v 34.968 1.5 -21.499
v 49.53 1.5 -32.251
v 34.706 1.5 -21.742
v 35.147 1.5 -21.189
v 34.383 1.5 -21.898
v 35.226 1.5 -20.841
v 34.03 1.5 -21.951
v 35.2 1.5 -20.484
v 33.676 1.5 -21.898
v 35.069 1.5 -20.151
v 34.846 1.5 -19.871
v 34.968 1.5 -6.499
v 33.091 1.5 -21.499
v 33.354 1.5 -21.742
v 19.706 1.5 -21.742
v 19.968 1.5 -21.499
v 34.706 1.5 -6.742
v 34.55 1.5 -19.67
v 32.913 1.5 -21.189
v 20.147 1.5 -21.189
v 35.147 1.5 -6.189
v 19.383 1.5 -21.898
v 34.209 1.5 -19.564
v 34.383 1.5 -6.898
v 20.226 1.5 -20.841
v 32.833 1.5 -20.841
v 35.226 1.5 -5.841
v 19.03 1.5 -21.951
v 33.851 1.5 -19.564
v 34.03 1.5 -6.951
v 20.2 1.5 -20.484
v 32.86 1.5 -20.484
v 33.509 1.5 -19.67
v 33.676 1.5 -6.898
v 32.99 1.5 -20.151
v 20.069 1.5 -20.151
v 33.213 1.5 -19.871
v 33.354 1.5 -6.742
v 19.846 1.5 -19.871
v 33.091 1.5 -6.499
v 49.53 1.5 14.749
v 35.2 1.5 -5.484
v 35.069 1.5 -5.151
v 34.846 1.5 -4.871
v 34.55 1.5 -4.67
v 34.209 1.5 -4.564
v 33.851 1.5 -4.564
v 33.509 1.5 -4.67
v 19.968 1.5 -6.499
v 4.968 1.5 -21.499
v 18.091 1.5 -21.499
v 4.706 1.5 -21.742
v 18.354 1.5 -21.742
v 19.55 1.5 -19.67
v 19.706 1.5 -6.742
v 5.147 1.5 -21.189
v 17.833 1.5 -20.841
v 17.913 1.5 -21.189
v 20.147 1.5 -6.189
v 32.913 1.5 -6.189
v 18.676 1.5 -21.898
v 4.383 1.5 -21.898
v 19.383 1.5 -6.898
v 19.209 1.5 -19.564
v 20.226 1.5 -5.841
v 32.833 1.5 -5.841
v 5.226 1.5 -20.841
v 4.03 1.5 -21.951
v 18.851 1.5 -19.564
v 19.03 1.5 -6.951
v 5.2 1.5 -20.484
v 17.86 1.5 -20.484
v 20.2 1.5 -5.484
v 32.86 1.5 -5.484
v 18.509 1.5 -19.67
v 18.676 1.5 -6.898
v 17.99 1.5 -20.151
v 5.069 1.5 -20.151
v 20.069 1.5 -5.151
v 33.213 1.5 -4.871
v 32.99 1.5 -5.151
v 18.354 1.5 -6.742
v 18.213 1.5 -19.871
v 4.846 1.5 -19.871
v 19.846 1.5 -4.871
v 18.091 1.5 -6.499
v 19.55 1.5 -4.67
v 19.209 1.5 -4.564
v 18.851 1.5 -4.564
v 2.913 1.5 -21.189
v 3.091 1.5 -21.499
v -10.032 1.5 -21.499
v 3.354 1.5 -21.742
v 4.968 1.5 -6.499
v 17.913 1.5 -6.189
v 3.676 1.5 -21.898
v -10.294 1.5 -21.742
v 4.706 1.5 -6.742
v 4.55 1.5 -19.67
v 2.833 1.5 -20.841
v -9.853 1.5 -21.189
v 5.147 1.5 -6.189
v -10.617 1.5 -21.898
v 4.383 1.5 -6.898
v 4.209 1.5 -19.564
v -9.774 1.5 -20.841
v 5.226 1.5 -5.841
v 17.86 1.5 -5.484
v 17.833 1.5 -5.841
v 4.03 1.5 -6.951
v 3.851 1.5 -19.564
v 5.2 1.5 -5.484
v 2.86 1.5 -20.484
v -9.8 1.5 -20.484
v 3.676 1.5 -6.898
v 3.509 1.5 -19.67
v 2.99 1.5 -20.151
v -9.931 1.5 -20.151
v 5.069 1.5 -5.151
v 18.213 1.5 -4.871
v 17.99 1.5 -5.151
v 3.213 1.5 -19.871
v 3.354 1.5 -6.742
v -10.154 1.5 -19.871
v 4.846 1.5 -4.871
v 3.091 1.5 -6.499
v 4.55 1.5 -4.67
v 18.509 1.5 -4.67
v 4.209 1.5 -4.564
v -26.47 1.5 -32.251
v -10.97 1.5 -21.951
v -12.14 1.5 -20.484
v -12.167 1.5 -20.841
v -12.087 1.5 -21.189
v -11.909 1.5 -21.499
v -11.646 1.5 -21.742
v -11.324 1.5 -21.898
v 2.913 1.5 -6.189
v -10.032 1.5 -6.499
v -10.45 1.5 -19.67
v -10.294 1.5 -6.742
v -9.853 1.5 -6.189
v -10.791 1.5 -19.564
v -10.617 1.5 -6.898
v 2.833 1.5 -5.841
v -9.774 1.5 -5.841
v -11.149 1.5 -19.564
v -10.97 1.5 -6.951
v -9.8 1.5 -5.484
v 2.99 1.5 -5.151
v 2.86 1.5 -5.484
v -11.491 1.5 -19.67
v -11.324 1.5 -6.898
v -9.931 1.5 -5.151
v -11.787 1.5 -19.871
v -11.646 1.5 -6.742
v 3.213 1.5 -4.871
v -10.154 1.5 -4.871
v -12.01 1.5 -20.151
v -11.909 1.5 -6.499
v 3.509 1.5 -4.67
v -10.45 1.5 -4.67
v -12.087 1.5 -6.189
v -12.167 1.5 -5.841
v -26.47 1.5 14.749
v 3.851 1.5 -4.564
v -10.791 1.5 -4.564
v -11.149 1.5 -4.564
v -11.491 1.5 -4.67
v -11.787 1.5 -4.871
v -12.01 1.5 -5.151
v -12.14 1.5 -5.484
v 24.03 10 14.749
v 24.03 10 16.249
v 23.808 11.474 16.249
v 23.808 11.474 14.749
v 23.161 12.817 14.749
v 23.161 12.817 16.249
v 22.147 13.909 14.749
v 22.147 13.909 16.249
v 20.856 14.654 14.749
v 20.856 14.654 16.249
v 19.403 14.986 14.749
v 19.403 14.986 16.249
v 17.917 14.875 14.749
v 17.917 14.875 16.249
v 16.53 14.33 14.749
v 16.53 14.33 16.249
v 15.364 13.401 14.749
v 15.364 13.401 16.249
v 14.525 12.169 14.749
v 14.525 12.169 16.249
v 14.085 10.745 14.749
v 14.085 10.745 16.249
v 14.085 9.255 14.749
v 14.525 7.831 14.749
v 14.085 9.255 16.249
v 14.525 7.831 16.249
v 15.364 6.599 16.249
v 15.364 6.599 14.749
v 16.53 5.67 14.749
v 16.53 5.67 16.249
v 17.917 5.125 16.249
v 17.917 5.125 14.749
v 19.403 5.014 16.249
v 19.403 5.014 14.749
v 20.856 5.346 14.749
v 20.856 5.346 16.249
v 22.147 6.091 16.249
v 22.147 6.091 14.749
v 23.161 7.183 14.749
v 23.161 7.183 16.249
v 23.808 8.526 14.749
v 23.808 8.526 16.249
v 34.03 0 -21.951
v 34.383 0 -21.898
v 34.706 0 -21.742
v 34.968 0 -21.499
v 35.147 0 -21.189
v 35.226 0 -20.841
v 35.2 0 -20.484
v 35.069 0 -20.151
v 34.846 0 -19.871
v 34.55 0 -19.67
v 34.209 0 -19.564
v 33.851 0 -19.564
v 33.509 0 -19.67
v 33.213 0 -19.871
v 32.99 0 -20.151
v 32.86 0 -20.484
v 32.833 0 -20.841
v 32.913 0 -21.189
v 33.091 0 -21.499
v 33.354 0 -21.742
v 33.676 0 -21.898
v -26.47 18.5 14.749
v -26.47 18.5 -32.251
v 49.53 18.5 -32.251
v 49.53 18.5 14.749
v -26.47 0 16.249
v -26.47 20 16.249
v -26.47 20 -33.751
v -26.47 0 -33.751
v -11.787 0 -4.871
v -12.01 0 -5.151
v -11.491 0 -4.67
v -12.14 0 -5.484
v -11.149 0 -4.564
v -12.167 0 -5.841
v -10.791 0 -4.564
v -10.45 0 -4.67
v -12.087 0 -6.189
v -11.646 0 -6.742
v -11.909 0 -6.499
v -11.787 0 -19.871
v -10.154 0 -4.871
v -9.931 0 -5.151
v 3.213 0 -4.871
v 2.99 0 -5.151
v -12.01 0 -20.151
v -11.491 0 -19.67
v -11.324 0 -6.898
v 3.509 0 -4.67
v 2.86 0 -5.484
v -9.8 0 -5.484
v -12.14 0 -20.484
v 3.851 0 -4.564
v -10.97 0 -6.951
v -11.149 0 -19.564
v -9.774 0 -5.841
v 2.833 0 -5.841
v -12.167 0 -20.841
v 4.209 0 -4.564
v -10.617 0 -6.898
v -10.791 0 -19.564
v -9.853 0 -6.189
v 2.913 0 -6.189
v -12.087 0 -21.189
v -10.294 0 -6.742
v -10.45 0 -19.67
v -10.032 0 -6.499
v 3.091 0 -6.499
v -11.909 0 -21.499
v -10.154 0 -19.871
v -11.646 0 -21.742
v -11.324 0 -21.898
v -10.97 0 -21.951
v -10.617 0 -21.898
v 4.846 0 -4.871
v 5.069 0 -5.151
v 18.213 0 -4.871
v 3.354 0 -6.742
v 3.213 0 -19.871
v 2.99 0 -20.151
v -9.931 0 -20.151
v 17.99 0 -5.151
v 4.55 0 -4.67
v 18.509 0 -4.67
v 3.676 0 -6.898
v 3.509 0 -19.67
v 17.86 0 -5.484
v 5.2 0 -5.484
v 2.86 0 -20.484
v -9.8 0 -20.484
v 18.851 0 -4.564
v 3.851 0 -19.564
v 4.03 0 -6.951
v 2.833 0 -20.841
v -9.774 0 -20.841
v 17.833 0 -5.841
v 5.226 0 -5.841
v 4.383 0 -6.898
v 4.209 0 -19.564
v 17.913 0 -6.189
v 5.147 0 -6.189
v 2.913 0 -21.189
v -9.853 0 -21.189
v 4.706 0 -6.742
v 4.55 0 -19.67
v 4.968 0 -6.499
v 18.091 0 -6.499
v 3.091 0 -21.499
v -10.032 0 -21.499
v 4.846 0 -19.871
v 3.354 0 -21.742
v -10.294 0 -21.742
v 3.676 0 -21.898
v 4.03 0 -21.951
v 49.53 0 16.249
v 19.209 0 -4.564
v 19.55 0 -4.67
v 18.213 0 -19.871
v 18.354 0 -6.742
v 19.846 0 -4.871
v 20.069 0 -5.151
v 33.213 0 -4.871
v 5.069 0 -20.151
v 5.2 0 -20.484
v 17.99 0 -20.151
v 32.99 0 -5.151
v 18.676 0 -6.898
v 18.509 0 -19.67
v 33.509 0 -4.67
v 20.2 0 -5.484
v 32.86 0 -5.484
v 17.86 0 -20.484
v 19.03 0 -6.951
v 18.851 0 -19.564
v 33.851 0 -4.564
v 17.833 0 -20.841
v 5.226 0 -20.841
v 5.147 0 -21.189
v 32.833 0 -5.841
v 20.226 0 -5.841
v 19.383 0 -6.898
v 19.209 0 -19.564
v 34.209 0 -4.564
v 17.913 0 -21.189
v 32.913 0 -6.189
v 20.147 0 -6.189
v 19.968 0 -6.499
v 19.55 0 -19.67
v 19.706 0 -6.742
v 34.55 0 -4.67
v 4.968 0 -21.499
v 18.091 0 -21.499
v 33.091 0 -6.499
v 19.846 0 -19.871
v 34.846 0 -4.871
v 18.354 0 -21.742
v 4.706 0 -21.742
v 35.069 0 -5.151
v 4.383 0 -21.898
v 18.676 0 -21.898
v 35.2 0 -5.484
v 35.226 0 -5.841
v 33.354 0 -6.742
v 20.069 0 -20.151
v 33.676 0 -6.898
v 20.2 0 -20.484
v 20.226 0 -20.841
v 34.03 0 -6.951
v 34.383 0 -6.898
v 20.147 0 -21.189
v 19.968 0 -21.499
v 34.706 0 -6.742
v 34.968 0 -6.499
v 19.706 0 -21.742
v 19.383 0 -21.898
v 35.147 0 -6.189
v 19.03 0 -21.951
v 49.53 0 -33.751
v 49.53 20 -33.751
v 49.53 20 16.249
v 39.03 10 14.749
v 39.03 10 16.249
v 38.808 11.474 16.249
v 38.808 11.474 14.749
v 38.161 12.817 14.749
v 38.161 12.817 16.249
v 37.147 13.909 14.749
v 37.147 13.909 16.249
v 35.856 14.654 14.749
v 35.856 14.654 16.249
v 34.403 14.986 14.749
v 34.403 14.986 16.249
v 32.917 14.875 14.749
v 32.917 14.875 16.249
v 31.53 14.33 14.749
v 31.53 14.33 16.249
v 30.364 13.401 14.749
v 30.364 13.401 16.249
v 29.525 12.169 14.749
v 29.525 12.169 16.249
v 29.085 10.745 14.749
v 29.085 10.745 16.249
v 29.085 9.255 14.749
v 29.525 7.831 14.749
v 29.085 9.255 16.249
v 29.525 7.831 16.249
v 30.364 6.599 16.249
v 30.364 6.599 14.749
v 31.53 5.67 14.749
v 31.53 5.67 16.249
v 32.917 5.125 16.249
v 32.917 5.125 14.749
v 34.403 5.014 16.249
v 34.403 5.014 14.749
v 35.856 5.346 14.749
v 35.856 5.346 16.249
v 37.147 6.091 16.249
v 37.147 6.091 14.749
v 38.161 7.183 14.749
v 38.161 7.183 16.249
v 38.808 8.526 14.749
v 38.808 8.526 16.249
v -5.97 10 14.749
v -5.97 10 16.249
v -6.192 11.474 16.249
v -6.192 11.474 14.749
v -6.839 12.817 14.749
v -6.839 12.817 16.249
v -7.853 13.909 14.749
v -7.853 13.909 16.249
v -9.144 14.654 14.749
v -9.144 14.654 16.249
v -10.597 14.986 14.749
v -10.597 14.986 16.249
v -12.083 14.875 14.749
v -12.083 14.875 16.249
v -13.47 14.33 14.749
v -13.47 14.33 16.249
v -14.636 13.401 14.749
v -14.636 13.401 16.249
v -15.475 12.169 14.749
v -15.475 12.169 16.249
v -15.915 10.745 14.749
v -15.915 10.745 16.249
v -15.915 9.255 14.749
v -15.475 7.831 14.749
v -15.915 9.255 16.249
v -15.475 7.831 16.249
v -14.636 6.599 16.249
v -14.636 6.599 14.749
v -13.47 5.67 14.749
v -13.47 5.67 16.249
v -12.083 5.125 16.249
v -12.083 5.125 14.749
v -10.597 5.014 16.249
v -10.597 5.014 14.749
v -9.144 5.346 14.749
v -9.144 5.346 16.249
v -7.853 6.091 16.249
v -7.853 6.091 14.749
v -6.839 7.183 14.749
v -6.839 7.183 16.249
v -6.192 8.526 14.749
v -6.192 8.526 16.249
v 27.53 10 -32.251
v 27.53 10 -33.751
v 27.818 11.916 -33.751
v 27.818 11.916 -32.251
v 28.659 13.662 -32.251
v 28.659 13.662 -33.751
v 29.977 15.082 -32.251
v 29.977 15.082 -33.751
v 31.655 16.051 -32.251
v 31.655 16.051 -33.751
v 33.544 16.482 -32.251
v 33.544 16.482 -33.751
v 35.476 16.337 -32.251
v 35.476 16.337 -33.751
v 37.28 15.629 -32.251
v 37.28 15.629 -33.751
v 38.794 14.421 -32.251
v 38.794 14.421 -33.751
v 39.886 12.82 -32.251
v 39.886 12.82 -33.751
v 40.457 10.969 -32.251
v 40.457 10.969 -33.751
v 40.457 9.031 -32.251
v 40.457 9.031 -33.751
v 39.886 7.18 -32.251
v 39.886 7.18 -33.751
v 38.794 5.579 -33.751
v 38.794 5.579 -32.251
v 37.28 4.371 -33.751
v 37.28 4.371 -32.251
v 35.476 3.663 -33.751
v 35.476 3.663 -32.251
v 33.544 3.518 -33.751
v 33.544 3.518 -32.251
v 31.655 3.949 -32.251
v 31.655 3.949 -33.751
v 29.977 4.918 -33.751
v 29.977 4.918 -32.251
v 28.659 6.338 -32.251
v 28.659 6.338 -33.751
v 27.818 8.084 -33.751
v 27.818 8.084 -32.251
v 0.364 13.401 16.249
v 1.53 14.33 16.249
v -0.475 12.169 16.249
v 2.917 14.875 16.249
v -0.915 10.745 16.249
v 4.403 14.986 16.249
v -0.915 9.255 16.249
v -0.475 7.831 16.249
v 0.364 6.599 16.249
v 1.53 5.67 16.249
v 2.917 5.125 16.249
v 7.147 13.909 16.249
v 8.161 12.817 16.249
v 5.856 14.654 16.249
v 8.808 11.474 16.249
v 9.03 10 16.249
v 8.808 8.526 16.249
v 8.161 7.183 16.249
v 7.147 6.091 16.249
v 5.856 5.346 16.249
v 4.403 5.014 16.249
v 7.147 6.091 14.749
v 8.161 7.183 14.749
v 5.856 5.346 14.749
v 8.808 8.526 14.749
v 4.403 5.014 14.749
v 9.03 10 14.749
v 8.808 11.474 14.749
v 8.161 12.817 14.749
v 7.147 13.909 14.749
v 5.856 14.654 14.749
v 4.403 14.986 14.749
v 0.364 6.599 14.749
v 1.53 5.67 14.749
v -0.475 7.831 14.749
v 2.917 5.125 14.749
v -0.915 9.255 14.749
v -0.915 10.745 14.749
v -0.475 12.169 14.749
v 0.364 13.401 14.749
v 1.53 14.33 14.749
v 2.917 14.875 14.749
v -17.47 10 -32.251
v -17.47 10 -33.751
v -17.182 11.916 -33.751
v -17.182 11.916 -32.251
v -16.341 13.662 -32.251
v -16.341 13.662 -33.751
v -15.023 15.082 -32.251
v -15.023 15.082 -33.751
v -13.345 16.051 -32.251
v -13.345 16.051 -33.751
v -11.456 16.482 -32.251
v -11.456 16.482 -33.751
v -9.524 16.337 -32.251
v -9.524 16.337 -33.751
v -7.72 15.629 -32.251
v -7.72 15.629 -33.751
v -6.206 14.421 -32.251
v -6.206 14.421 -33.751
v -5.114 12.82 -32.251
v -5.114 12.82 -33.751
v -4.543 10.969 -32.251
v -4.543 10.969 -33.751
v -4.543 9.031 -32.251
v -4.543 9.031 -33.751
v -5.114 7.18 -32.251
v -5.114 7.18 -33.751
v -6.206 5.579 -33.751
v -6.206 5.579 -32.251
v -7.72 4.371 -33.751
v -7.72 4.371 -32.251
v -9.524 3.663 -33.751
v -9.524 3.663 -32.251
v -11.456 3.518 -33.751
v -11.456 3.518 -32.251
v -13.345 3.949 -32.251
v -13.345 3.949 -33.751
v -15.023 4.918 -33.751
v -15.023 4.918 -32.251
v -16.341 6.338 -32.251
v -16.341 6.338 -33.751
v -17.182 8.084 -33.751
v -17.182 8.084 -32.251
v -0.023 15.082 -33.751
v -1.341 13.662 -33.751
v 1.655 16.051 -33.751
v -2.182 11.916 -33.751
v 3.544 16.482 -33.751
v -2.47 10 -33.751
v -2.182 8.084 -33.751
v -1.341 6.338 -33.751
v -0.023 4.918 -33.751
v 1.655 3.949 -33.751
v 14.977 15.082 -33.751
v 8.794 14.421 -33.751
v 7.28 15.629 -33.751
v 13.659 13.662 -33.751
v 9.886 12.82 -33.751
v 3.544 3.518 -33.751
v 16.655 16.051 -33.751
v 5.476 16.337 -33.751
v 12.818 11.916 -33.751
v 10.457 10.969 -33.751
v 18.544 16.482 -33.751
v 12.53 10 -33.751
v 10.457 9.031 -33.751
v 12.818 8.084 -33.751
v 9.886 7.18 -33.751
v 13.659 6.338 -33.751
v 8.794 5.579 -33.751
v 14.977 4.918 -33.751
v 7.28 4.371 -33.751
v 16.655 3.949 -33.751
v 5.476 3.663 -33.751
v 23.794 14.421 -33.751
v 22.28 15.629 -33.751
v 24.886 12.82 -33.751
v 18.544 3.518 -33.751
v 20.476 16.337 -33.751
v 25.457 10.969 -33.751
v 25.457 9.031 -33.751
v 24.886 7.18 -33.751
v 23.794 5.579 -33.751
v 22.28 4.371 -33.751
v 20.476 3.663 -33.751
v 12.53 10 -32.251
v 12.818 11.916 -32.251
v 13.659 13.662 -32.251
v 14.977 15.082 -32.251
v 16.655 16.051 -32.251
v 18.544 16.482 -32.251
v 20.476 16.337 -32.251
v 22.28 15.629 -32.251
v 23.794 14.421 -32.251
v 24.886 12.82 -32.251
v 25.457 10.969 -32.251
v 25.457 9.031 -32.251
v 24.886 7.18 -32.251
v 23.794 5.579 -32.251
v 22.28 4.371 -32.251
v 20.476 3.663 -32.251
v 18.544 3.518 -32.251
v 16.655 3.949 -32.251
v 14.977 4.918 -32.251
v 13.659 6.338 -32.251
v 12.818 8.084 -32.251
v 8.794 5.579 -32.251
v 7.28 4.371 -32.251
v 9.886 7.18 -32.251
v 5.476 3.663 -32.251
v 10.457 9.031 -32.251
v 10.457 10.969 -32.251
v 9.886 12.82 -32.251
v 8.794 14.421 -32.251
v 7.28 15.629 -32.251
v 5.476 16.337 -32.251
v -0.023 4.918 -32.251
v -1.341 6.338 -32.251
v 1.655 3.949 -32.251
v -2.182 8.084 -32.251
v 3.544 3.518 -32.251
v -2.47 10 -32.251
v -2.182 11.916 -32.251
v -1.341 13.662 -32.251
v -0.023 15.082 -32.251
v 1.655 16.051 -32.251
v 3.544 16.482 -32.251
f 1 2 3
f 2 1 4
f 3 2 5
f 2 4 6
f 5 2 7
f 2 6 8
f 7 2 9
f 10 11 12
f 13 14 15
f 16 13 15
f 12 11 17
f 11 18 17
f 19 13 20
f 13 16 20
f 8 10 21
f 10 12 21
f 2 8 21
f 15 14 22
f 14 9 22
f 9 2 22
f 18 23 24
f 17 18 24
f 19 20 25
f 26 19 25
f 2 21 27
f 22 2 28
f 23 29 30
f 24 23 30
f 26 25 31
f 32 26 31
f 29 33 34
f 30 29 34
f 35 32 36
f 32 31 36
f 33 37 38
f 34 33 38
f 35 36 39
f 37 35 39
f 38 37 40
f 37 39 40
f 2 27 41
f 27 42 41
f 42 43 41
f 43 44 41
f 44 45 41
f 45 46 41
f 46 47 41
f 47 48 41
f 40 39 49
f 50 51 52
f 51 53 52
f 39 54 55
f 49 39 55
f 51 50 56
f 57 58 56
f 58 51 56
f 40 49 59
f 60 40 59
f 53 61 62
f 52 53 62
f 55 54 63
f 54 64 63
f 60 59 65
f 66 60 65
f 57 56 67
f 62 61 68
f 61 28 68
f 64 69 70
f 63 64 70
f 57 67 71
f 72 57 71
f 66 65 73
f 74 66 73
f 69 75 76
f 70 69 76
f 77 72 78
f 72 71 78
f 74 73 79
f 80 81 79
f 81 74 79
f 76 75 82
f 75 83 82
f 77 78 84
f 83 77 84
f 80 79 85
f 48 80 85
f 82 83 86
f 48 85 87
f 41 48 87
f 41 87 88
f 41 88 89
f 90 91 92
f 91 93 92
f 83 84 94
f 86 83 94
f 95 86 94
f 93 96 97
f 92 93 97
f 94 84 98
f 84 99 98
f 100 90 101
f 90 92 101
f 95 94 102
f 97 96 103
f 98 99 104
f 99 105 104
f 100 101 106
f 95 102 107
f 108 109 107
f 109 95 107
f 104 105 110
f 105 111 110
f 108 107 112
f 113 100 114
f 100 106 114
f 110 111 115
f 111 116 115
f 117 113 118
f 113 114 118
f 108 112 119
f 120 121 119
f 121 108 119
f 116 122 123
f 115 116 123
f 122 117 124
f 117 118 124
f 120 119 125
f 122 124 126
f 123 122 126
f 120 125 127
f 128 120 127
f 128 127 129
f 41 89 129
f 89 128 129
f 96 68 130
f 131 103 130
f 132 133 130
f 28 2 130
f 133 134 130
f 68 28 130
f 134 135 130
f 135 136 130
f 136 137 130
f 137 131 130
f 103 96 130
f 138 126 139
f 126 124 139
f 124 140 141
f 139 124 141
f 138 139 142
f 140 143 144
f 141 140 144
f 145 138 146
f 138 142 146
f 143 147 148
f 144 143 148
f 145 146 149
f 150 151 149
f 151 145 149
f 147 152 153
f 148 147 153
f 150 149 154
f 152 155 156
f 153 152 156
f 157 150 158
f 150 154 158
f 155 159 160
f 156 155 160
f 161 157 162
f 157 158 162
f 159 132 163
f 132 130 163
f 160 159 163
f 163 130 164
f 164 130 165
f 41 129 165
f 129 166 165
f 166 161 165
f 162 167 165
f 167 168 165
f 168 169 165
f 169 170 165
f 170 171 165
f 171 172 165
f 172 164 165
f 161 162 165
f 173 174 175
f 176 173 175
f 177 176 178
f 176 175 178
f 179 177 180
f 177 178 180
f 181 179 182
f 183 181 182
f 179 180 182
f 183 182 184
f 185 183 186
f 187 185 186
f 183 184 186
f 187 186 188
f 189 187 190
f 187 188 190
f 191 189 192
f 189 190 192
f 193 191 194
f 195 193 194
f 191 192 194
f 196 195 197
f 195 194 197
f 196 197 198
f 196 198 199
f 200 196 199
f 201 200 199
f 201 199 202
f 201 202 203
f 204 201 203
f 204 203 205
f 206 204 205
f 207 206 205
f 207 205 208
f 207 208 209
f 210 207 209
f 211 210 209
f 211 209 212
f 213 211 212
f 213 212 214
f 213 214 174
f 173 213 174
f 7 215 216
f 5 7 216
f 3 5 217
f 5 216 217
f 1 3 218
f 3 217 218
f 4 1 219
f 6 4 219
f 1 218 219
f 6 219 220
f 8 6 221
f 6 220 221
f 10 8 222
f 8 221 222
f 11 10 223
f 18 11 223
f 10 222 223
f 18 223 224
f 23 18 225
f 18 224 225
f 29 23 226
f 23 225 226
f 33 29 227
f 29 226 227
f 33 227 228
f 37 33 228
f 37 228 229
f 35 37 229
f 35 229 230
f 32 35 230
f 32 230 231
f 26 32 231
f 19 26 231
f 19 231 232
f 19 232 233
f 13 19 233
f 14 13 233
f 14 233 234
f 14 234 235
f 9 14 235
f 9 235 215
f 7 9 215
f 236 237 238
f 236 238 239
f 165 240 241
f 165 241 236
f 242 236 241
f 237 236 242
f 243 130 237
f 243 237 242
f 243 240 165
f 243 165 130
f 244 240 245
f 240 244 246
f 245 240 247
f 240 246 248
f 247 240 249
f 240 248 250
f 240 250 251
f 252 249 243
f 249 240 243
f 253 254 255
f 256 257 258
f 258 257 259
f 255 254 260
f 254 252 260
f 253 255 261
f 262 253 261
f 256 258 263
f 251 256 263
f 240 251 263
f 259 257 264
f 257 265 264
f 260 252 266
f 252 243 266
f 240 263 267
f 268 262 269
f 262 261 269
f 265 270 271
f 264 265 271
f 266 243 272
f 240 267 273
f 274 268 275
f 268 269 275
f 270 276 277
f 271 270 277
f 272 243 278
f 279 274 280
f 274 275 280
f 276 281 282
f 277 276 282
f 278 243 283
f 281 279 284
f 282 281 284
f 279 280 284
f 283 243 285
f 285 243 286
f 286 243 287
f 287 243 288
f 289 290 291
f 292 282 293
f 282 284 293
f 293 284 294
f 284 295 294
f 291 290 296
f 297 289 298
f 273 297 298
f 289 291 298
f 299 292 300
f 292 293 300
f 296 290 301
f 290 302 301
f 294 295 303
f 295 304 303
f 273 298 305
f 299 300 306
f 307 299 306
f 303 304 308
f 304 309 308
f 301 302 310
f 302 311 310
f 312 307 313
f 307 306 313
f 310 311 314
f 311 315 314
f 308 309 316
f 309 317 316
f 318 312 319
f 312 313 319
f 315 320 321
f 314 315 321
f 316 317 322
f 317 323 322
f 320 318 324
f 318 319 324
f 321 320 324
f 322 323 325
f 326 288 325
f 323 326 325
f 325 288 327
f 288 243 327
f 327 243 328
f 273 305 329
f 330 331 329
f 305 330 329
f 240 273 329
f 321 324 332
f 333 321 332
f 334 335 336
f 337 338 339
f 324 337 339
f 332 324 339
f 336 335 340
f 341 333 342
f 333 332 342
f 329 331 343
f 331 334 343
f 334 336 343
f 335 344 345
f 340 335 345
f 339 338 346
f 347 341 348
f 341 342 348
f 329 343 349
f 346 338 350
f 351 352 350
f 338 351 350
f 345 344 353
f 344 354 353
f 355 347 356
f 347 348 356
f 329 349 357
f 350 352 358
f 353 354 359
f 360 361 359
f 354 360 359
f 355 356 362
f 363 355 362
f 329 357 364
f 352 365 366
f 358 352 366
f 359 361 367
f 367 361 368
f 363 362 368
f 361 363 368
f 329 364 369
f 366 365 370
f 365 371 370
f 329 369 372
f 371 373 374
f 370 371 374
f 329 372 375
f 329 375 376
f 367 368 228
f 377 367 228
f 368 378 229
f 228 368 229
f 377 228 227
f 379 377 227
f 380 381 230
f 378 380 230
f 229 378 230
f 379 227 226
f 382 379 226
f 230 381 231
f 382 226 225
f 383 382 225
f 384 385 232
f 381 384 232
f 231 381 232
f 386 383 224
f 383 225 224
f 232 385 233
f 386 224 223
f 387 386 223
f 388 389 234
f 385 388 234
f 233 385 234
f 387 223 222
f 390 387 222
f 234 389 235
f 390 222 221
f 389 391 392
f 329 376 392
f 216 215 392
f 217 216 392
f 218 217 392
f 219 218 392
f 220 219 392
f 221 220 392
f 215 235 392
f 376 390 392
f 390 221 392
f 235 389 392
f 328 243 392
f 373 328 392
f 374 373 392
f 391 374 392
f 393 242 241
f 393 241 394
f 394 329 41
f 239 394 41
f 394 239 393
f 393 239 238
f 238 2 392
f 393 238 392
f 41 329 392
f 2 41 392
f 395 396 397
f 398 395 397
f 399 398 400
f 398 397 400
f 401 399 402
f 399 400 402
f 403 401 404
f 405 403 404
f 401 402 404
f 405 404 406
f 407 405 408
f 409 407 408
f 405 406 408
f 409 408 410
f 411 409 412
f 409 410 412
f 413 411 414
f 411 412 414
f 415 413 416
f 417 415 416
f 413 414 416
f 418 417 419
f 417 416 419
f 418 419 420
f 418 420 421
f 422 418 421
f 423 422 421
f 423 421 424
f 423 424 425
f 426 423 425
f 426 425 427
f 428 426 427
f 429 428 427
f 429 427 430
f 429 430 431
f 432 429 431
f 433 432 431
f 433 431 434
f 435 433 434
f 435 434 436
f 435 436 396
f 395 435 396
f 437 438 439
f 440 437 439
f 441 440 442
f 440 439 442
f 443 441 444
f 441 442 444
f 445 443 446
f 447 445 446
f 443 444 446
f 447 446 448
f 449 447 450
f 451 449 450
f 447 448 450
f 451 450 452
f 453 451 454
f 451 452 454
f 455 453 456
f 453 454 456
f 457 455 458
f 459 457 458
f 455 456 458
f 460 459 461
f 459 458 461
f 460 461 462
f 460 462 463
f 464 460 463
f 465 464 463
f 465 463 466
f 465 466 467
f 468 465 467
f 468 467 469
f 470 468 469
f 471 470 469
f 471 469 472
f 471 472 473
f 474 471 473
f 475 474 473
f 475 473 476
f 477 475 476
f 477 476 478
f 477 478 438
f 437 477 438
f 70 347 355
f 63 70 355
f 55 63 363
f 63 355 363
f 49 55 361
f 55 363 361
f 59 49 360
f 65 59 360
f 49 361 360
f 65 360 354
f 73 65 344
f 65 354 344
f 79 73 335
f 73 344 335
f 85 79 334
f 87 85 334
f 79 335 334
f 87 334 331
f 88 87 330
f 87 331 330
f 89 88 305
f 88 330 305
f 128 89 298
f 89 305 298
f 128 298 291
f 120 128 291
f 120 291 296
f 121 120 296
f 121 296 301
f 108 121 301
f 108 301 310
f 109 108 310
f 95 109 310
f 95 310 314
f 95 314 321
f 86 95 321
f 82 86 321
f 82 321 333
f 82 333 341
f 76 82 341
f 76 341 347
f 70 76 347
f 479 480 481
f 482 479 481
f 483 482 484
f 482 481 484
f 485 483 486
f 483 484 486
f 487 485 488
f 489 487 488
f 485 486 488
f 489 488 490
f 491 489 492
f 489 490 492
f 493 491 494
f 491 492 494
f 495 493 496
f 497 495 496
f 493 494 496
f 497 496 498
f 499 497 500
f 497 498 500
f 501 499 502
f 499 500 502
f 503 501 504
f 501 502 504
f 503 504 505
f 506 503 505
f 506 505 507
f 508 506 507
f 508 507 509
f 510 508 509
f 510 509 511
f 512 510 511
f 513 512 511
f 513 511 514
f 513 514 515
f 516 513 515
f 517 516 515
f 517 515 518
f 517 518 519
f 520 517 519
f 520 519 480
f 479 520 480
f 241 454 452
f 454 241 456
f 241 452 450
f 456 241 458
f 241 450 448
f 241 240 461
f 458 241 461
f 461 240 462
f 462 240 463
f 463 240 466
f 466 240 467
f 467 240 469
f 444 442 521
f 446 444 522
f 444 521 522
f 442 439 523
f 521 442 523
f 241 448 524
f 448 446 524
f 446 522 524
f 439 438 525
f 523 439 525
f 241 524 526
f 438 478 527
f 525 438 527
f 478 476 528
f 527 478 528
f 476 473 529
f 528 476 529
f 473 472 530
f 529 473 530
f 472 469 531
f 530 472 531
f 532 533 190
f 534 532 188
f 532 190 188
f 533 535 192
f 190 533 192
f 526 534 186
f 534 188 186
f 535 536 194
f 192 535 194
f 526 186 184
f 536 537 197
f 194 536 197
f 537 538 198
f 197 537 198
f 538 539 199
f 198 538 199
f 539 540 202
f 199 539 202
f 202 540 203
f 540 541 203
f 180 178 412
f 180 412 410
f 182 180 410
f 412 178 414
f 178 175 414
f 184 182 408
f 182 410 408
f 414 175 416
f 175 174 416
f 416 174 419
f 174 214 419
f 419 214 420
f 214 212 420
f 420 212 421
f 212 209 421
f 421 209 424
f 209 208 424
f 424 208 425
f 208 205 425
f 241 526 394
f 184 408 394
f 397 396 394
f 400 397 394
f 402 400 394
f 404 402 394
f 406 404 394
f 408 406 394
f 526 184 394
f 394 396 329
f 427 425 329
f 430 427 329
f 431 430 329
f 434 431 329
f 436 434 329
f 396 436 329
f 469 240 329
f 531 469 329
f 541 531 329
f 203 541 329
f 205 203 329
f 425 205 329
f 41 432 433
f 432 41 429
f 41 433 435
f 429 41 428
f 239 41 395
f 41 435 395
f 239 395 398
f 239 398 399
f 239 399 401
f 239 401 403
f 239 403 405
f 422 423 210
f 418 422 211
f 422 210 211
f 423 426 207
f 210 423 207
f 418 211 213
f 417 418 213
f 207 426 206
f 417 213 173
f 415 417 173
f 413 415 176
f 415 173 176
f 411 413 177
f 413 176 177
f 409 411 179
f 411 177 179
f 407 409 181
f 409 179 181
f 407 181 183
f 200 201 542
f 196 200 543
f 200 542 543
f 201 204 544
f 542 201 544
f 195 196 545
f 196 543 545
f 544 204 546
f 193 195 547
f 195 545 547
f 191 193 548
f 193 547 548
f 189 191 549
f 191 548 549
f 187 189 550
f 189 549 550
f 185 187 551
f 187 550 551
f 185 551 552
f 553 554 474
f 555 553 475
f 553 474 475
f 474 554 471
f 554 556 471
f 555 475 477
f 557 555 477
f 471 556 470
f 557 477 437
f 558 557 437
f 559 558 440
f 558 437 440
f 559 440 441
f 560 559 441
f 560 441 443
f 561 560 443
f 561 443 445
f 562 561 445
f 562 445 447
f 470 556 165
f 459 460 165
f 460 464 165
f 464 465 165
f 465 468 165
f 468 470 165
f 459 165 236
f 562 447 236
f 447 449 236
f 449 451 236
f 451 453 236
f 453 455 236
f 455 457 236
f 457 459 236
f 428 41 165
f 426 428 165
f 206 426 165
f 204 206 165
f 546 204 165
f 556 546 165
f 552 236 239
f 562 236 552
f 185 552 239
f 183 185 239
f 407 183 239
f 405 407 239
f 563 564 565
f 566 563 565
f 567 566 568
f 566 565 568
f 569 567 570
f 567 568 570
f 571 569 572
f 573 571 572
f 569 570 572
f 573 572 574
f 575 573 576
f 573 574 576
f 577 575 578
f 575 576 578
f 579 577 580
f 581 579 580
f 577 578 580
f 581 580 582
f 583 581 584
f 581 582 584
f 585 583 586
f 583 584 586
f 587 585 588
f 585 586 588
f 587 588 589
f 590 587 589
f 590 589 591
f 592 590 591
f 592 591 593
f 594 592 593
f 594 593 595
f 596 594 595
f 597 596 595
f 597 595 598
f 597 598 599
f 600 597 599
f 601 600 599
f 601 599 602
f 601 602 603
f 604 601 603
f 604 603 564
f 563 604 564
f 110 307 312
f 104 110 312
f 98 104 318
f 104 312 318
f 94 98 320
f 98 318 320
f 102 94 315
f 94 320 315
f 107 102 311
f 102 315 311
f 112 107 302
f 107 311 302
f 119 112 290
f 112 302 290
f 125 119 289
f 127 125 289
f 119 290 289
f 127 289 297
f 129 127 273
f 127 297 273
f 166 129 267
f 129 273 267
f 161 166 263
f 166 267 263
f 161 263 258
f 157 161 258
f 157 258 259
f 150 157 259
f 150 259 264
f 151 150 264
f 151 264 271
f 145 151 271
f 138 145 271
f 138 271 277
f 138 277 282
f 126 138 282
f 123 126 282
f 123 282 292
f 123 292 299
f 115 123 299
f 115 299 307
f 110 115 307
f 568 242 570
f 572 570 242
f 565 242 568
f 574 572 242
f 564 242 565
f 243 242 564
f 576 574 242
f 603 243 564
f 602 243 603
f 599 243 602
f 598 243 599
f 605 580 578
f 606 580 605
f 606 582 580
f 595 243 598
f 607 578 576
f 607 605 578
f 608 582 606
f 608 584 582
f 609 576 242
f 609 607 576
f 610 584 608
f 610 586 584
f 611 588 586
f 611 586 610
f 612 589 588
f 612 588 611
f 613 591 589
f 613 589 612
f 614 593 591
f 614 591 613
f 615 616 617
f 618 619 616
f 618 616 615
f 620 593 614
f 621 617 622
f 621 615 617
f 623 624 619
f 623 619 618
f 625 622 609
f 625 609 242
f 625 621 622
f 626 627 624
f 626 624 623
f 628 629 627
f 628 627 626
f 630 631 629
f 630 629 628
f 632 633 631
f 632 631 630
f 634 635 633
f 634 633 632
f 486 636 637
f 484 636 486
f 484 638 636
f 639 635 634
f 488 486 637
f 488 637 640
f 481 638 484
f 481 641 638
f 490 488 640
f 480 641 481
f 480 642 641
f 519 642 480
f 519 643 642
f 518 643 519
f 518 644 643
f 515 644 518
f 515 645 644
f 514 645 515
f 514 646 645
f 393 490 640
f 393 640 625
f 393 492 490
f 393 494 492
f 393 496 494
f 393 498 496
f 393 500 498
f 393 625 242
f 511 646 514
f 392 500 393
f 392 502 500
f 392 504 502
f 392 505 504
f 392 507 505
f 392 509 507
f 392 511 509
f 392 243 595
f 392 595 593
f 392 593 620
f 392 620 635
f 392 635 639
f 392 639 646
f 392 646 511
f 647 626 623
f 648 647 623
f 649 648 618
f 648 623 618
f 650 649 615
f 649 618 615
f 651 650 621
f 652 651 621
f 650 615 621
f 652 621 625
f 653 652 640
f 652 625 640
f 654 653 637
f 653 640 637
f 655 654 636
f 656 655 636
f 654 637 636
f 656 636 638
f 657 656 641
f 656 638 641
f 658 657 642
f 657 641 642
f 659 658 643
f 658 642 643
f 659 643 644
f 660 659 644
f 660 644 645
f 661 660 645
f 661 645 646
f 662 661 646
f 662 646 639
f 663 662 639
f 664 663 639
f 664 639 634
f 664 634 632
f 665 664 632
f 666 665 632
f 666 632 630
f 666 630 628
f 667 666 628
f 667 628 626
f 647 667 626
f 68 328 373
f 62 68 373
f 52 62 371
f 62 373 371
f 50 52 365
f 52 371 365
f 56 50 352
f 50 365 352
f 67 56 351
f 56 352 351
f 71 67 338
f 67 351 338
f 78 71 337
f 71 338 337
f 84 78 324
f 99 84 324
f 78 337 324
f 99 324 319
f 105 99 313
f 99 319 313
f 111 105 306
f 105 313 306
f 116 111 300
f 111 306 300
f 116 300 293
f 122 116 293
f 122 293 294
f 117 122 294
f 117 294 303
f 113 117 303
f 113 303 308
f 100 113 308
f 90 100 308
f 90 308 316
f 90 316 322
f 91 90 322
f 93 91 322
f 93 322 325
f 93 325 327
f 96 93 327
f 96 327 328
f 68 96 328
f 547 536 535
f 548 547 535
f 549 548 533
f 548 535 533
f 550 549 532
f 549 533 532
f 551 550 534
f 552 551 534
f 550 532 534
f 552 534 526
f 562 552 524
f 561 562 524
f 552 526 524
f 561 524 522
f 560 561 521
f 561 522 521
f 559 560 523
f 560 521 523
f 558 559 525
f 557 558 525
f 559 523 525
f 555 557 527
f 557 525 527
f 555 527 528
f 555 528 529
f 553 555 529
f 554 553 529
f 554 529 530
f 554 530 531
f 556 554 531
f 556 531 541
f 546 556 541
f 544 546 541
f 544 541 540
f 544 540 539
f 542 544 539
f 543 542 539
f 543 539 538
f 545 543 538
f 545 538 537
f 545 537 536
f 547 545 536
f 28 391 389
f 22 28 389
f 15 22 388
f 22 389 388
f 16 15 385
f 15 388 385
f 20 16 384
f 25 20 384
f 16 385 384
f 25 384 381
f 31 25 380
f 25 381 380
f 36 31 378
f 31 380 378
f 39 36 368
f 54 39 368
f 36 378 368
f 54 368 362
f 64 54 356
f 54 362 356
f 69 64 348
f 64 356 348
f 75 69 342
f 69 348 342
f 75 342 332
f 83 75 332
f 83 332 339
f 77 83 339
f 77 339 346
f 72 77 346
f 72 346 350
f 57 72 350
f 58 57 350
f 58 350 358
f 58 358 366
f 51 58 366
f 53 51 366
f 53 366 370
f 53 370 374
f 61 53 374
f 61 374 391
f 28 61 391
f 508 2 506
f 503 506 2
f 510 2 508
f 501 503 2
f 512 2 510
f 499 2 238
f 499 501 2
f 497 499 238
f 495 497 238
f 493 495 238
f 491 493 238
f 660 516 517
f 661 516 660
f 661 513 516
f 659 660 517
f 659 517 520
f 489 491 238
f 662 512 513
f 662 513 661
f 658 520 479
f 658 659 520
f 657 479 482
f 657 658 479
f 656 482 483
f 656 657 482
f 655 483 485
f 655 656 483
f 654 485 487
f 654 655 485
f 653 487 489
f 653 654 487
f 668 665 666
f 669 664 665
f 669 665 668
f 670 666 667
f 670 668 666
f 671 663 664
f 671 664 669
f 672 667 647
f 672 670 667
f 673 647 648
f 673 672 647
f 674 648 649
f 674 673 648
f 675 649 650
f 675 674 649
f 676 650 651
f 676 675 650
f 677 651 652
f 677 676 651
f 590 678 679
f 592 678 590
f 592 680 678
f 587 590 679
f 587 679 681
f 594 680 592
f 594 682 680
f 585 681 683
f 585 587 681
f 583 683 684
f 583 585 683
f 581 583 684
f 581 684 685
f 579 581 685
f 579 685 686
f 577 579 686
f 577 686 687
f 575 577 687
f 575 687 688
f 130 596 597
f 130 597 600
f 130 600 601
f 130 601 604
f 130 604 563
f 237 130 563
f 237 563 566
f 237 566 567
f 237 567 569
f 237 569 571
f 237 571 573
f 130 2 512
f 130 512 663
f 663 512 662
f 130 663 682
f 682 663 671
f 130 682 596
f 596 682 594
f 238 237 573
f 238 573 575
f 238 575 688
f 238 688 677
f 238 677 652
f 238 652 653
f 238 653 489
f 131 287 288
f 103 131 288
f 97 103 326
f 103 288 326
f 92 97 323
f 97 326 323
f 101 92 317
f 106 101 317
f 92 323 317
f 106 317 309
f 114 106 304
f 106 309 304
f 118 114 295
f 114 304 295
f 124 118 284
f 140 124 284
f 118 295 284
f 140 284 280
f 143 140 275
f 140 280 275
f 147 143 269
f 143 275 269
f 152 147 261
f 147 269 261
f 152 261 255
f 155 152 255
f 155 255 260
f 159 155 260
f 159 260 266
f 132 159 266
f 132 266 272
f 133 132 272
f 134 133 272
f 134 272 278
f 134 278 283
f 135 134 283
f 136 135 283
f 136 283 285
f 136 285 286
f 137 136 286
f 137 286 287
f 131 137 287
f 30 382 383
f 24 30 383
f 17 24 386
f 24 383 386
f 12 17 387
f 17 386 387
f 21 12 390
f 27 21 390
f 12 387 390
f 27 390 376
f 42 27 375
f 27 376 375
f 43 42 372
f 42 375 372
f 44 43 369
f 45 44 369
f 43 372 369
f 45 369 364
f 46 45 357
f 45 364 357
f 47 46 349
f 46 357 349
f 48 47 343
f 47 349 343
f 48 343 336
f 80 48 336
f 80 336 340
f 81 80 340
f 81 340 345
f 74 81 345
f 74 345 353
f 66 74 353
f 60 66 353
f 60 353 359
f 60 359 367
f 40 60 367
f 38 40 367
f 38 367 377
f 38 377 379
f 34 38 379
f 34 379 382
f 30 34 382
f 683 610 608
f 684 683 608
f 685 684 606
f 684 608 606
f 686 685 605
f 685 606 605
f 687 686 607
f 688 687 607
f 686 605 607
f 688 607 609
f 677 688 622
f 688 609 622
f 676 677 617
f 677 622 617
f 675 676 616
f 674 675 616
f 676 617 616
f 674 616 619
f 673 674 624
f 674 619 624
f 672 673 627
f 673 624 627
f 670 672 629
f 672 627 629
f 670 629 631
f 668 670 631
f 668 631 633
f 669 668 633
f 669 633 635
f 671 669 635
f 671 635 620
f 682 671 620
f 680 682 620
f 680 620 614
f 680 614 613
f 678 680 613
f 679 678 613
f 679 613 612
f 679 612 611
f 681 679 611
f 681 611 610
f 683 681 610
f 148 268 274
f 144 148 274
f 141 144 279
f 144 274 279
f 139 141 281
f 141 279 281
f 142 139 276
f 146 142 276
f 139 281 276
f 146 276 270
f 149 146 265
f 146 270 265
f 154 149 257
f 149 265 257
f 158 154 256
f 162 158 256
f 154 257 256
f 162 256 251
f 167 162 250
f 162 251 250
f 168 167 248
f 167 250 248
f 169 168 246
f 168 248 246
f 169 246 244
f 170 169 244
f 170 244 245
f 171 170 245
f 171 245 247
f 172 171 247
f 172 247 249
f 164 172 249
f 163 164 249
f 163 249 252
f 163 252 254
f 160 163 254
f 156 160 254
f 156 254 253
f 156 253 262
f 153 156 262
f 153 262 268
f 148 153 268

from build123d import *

# Parameters (mm, degrees)
SKETCH1_W           = 76
SKETCH1_H           = 50
BOSS_EXTRUDE1_DEPTH = 20
SKETCH2_W           = 47
SKETCH2_H           = 17
CUT_EXTRUDE1_DEPTH  = 76
SKETCH3_R           = 6.5
CUT_EXTRUDE2_DEPTH  = 2
SKETCH4_R           = 5
CUT_EXTRUDE3_DEPTH  = 2
SKETCH5_R           = 1.2
CUT_EXTRUDE4_DEPTH  = 2


with BuildPart() as part:
    # Sketch1 → Boss-Extrude1 (new body)
    with BuildSketch(Plane(origin=(0, 0, 0), x_dir=(1, 0, 0), z_dir=(0, 1, 0))):
        with Locations((11.529653553, 8.750876438)):
            Rectangle(SKETCH1_W, SKETCH1_H)
    extrude(amount=BOSS_EXTRUDE1_DEPTH)

    # Sketch2 → Cut-Extrude1 (cut)
    with BuildSketch(Plane.ZY.offset(26.470346447)):
        with Locations((-8.750876438, 10)):
            Rectangle(SKETCH2_W, SKETCH2_H)
    extrude(amount=-CUT_EXTRUDE1_DEPTH, mode=Mode.SUBTRACT)

    # Sketch3 → Cut-Extrude2 (cut)
    with BuildSketch(Plane(origin=(0, 0, -33.750876438), x_dir=(-1, 0, 0), z_dir=(0, 0, -1))):
        with Locations((10.970346447, 10)):
            Circle(SKETCH3_R)
        with Locations((-4.029653553, 10)):
            Circle(SKETCH3_R)
        with Locations((-19.029653553, 10)):
            Circle(SKETCH3_R)
        with Locations((-34.029653553, 10)):
            Circle(SKETCH3_R)
    extrude(amount=-CUT_EXTRUDE2_DEPTH, mode=Mode.SUBTRACT)

    # Sketch4 → Cut-Extrude3 (cut)
    with BuildSketch(Plane.XY.offset(16.249123562)):
        with Locations((-10.970346447, 10)):
            Circle(SKETCH4_R)
        with Locations((4.029653553, 10)):
            Circle(SKETCH4_R)
        with Locations((19.029653553, 10)):
            Circle(SKETCH4_R)
        with Locations((34.029653553, 10)):
            Circle(SKETCH4_R)
    extrude(amount=-CUT_EXTRUDE3_DEPTH, mode=Mode.SUBTRACT)

    # Sketch5 → Cut-Extrude4 (cut)
    with BuildSketch(Plane(origin=(0, 0, 0), x_dir=(-1, 0, 0), z_dir=(0, -1, 0))):
        with Locations(Location((-34.029653553, 20.750876438, 0), (0, 0, 90))):  # turned: the seam where the file's is
            Circle(SKETCH5_R)
        with Locations(Location((-19.029653553, 20.750876438, 0), (0, 0, 90))):  # turned: the seam where the file's is
            Circle(SKETCH5_R)
        with Locations(Location((-4.029653553, 20.750876438, 0), (0, 0, 90))):  # turned: the seam where the file's is
            Circle(SKETCH5_R)
        with Locations(Location((10.970346447, 20.750876438, 0), (0, 0, 90))):  # turned: the seam where the file's is
            Circle(SKETCH5_R)
        with Locations(Location((-19.029653553, 5.750876438, 0), (0, 0, 90))):  # turned: the seam where the file's is
            Circle(SKETCH5_R)
        with Locations(Location((-4.029653553, 5.750876438, 0), (0, 0, 90))):  # turned: the seam where the file's is
            Circle(SKETCH5_R)
        with Locations(Location((10.970346447, 5.750876438, 0), (0, 0, 90))):  # turned: the seam where the file's is
            Circle(SKETCH5_R)
        with Locations(Location((-34.029653553, 5.750876438, 0), (0, 0, 90))):  # turned: the seam where the file's is
            Circle(SKETCH5_R)
    extrude(amount=-CUT_EXTRUDE4_DEPTH, mode=Mode.SUBTRACT)


solid = part.part
